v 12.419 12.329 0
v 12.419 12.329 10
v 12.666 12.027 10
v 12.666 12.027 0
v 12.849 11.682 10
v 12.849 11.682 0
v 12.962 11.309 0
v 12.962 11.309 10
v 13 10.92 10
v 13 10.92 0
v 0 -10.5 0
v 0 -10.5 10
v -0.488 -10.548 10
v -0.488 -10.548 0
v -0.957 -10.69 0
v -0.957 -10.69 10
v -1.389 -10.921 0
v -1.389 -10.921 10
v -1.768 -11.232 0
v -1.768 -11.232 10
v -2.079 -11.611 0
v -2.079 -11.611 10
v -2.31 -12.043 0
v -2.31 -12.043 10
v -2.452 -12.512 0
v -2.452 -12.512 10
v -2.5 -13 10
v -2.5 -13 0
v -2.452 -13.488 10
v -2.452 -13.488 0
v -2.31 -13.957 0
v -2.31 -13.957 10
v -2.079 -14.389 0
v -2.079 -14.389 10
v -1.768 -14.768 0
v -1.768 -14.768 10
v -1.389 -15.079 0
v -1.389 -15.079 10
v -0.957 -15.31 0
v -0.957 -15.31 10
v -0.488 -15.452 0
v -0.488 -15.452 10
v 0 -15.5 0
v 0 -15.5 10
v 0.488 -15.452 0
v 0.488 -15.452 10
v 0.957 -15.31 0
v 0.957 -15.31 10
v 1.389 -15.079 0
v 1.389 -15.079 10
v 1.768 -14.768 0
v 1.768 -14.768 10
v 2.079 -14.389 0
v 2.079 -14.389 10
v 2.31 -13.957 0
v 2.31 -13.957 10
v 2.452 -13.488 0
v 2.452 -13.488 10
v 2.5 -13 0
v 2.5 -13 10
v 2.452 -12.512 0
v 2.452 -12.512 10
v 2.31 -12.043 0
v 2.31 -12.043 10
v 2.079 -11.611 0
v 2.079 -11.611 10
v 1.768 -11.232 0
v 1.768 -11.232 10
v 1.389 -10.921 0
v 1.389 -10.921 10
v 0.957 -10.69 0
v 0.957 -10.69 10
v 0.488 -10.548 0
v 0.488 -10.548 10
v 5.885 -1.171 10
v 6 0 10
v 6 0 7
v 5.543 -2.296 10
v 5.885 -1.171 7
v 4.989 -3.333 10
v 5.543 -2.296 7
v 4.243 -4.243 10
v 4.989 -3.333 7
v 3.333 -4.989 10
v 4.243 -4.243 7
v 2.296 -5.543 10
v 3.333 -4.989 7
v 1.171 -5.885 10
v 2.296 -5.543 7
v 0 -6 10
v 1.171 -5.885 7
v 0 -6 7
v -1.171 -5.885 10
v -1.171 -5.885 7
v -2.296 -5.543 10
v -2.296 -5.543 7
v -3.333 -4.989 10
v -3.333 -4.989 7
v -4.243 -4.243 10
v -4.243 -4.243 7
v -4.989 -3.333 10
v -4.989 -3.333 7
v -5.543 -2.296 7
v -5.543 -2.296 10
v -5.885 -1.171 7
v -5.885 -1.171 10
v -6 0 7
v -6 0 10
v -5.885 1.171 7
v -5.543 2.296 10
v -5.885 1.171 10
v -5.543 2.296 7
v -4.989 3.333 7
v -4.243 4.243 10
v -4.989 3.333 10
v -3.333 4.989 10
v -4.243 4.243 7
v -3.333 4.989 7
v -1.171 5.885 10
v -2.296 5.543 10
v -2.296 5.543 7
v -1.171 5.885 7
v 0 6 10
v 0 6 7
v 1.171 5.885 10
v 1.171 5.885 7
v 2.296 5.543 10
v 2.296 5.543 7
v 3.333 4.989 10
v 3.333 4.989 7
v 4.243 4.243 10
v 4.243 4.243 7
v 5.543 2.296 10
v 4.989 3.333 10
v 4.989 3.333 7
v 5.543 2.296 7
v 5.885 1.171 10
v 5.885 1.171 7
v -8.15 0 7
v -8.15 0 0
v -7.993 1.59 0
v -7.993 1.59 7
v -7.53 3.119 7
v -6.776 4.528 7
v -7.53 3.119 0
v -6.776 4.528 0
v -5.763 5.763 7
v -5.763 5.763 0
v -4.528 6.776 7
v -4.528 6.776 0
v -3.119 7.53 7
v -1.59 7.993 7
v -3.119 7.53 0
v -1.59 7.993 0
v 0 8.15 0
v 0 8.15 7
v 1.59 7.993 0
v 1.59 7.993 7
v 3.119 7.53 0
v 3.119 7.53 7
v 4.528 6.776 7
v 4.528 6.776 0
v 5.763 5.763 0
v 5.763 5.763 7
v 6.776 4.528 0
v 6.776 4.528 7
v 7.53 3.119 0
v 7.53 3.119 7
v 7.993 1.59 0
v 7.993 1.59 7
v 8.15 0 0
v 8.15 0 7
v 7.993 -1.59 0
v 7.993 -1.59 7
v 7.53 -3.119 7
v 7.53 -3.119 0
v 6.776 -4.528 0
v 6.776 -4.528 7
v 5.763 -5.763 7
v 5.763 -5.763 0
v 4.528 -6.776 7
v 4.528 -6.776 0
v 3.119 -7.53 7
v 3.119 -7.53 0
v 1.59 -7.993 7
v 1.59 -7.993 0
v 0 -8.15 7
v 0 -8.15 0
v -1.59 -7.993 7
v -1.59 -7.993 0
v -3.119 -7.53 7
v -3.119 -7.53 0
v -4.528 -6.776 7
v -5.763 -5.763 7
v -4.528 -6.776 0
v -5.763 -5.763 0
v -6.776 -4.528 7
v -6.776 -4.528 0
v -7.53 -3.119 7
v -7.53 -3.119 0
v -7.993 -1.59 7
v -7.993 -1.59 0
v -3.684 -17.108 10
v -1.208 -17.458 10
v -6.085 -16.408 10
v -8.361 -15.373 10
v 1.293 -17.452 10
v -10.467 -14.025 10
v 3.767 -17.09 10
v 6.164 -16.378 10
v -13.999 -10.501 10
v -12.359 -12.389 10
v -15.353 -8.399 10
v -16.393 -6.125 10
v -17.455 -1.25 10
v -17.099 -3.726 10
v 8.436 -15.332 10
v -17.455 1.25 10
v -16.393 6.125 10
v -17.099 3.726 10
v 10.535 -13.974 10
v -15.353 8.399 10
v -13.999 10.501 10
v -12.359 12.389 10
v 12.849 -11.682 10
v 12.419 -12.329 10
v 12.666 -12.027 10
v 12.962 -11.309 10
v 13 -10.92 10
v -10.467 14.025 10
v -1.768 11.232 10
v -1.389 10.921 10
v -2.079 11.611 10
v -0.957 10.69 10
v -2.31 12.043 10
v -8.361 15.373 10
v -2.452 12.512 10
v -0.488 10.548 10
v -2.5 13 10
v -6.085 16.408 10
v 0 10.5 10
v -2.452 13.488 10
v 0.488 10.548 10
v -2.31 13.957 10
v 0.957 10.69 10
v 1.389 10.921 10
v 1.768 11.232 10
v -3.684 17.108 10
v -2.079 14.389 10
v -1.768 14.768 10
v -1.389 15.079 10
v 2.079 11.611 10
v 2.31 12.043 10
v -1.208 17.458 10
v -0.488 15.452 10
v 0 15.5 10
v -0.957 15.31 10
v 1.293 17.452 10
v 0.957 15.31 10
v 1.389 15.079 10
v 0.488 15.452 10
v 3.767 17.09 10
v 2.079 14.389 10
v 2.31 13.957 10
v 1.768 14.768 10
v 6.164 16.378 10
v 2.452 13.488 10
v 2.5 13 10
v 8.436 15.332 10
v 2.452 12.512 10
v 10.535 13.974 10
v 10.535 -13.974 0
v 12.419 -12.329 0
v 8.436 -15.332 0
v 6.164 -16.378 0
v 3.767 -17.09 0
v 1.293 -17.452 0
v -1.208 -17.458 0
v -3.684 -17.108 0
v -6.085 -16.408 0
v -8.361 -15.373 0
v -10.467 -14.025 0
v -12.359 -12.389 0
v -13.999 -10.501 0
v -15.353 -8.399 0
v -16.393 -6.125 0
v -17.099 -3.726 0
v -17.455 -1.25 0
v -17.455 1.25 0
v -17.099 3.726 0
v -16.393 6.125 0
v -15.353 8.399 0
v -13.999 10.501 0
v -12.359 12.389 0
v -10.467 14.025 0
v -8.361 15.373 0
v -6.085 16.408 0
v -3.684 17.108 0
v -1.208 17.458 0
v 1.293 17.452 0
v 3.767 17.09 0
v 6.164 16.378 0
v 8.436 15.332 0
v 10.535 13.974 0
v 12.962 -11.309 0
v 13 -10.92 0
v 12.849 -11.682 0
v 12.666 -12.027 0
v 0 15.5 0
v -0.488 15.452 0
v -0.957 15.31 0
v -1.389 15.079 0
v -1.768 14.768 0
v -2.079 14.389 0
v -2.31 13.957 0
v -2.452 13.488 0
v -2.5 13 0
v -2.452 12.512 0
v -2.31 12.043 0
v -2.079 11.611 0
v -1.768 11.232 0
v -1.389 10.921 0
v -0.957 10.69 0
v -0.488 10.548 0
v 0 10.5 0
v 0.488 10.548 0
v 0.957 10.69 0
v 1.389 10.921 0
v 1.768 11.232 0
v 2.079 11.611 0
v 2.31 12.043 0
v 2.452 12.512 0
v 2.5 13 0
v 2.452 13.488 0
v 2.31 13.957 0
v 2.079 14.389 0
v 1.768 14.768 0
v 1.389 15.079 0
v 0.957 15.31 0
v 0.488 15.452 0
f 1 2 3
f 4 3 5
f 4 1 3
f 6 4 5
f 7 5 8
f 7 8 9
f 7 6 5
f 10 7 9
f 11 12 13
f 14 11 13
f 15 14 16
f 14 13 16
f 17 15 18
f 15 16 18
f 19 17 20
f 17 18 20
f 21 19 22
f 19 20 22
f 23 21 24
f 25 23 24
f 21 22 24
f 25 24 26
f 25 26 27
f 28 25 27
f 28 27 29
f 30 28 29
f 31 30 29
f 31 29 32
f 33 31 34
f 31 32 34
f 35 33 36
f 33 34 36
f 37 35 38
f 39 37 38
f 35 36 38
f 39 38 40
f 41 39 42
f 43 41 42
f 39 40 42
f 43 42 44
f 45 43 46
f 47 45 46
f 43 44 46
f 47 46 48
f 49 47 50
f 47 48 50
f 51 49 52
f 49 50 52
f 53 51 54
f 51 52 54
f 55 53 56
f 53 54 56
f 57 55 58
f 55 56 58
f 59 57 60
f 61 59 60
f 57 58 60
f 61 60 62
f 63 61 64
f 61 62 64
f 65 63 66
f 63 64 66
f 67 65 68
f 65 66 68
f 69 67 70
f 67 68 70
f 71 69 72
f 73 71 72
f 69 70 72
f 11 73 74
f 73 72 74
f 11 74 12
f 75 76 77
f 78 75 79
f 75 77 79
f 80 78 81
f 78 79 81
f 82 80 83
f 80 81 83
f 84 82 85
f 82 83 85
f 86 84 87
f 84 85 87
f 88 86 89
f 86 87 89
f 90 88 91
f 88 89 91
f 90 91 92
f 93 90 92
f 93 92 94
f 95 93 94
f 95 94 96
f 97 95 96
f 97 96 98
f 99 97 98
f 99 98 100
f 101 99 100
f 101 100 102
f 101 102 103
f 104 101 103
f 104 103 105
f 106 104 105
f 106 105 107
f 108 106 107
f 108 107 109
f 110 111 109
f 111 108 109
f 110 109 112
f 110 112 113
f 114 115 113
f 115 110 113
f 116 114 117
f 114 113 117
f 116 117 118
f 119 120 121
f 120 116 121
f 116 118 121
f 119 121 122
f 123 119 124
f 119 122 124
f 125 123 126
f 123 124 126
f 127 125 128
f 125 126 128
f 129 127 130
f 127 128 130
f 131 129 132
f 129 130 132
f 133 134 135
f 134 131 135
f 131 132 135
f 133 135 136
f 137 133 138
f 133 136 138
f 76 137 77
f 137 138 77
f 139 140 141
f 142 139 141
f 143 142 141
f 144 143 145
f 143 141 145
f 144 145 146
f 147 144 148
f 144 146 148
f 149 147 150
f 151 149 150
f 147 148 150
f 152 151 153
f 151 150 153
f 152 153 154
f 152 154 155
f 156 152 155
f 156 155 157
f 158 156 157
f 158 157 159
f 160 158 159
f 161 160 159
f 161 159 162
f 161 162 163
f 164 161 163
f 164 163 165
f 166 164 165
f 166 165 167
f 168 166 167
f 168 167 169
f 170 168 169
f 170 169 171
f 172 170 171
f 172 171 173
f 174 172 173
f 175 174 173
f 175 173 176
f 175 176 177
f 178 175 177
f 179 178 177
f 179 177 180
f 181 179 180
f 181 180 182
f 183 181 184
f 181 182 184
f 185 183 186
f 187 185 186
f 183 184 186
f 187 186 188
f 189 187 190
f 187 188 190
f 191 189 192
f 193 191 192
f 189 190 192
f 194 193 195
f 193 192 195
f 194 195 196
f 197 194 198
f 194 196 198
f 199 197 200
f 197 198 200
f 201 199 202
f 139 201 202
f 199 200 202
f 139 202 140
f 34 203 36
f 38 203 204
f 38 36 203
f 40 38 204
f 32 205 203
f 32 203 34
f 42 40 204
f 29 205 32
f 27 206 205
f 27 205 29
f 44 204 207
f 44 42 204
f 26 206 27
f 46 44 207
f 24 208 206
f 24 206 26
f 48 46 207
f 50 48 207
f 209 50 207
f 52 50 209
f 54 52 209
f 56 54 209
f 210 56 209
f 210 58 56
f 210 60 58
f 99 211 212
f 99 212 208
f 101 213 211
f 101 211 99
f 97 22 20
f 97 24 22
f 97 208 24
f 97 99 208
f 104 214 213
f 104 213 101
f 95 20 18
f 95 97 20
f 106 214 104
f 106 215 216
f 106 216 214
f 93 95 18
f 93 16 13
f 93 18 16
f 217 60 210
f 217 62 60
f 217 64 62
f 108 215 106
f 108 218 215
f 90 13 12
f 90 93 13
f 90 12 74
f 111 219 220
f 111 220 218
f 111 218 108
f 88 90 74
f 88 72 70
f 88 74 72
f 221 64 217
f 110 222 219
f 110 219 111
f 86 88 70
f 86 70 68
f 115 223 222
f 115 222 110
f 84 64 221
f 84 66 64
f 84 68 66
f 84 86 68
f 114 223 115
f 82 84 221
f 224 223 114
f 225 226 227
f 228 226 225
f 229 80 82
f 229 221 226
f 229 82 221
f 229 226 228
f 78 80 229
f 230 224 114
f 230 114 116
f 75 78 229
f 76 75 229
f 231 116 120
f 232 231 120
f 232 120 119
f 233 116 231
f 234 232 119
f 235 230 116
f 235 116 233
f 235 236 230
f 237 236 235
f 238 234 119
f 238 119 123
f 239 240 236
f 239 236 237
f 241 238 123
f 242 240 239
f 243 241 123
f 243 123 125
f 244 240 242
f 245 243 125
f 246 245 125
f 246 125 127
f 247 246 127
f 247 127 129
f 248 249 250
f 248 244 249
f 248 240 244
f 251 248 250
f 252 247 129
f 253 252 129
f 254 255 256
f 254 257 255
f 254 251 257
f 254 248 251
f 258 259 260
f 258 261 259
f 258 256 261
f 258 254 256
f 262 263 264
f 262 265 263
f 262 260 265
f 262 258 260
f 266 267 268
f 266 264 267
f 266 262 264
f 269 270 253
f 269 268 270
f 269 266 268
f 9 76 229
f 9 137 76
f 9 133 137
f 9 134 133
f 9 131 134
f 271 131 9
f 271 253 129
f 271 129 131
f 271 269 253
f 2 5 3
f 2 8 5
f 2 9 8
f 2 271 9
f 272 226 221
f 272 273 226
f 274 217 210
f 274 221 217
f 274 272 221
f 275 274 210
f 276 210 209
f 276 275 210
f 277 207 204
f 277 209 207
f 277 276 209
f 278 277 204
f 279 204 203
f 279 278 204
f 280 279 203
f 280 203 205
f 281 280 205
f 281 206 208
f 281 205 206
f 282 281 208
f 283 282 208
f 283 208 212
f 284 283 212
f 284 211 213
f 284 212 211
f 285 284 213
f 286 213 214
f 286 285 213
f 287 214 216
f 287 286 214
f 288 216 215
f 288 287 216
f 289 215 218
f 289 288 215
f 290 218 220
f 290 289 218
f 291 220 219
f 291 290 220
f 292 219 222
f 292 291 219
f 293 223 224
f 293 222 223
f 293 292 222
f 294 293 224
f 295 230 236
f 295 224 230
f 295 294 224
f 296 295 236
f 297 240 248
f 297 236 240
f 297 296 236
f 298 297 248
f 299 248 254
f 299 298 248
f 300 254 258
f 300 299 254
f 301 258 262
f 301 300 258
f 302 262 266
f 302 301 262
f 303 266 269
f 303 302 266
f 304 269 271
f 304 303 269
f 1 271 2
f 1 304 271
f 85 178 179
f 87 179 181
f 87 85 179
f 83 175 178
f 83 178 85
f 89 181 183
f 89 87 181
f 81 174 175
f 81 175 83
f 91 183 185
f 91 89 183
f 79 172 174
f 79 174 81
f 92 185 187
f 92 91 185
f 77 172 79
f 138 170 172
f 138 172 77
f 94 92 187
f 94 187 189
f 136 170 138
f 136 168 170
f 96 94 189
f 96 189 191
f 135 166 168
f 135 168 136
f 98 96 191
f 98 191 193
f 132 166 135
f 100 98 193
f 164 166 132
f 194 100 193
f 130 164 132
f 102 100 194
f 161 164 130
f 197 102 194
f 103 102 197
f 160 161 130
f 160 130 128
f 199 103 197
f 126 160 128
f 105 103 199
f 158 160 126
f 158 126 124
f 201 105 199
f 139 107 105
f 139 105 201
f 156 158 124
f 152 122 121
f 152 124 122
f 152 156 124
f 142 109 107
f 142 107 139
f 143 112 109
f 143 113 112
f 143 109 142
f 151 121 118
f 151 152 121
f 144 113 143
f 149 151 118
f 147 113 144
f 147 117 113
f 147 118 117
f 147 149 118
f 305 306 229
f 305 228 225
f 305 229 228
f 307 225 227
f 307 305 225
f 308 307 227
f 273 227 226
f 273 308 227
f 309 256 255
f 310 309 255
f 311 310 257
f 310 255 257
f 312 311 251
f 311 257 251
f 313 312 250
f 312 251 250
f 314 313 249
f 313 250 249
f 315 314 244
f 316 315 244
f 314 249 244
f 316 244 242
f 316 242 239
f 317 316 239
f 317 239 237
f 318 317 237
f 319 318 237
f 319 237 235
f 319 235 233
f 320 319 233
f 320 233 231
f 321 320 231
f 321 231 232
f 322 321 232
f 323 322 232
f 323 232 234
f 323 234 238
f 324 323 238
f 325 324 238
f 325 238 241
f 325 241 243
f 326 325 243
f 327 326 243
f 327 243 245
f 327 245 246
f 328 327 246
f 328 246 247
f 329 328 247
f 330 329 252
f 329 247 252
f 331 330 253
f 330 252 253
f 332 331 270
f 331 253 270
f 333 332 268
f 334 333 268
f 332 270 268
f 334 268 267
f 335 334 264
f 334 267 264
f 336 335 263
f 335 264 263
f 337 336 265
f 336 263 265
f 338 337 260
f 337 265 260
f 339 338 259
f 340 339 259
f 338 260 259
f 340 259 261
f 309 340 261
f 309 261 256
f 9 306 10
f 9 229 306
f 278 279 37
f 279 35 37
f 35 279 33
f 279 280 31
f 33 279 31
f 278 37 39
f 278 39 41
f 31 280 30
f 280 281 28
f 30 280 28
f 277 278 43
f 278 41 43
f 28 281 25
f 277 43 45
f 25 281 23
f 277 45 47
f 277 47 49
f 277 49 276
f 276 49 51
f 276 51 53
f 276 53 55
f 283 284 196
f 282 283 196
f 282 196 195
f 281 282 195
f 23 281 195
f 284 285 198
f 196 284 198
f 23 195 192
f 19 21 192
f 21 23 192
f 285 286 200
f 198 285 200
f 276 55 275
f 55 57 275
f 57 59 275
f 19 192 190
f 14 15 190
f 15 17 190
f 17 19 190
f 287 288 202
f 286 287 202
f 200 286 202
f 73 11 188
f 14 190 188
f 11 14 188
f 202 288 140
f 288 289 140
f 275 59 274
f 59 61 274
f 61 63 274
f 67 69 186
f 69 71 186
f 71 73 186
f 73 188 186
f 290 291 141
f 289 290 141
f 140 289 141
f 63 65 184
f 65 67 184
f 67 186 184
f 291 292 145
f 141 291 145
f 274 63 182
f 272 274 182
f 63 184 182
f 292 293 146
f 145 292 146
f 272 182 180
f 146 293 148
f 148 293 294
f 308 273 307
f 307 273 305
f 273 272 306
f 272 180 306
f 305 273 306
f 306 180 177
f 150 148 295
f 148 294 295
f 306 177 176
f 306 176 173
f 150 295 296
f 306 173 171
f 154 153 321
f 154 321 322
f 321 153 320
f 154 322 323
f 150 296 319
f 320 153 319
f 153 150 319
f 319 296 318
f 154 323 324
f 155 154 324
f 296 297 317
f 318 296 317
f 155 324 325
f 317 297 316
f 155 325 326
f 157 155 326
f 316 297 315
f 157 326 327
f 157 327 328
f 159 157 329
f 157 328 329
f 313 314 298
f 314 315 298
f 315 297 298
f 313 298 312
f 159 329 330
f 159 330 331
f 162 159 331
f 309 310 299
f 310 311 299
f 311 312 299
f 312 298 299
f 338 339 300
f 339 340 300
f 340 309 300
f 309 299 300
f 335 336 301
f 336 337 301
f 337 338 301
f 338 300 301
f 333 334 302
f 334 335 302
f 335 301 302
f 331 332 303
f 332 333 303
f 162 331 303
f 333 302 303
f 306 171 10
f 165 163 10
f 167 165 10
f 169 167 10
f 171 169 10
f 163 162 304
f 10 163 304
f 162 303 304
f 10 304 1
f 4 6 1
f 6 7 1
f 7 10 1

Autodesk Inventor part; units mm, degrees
ref_plane "YZ Plane" through (0, 0, 0) normal (1, 0, 0) x (0, 1, 0)
ref_plane "XZ Plane" through (0, 0, 0) normal (0, 1, 0) x (-1, 0, 0)
ref_plane "XY Plane" through (0, 0, 0) normal (0, 0, 1) x (1, 0, 0)
sketch "Sketch1" plane through (0, 0, 0) normal (0, 0, 1) x (1, 0, 0)
  circle A0 centre (0, 0) radius 6
  circle A1 centre (0, 0) radius 17.5
  dimension "d0" = 12
  dimension "d1" = 35
extrude "Extrusion1" add sketch "Sketch1" along normal blind 10
sketch "Sketch4" plane through (0, 0, 0) normal (0, 0, -1) x (-1, 0, 0)
  circle A0 centre (0, 0) radius 13 construction
  point P0 (0, -13)
  point P1 (0, 13)
  dimension "d7" = 26
hole "Hole1" at (0, -13, 0) at (0, 13, 0) direction (0, 0, 1) diameter 5 end through all
sketch "Sketch5" plane through (0, 0, 0) normal (0, 0, -1) x (-1, 0, 0)
  circle A0 centre (0, 0) radius 8.15
  dimension "d15" = 16.3
extrude "Extrusion3" cut sketch "Sketch5" against normal blind 7
sketch "Sketch6" plane through (0, 0, 10) normal (0, 0, 1) x (1, 0, 0)
  line L0 (13, -11.7154) -> (13, 11.7154)
  circle A0 centre (0, 0) radius 17.5 projected
  circle A1 centre (0, -13) radius 2.5 construction
  circle A2 centre (0, 13) radius 2.5 construction
  line L1 (0, -13) -> (0, 13) construction
  dimension "d22" = 13
extrude "Extrusion4" cut sketch "Sketch6" against normal through all contours L0 A0 picked at (13.8164, -2.7401)
fillet "Fillet2" radius 2 2 edges at (13, -11.7154, 5) (13, 11.7154, 5)
properties part number "0008-10-034 Suport_Rulment" material "ABS Plastic"
